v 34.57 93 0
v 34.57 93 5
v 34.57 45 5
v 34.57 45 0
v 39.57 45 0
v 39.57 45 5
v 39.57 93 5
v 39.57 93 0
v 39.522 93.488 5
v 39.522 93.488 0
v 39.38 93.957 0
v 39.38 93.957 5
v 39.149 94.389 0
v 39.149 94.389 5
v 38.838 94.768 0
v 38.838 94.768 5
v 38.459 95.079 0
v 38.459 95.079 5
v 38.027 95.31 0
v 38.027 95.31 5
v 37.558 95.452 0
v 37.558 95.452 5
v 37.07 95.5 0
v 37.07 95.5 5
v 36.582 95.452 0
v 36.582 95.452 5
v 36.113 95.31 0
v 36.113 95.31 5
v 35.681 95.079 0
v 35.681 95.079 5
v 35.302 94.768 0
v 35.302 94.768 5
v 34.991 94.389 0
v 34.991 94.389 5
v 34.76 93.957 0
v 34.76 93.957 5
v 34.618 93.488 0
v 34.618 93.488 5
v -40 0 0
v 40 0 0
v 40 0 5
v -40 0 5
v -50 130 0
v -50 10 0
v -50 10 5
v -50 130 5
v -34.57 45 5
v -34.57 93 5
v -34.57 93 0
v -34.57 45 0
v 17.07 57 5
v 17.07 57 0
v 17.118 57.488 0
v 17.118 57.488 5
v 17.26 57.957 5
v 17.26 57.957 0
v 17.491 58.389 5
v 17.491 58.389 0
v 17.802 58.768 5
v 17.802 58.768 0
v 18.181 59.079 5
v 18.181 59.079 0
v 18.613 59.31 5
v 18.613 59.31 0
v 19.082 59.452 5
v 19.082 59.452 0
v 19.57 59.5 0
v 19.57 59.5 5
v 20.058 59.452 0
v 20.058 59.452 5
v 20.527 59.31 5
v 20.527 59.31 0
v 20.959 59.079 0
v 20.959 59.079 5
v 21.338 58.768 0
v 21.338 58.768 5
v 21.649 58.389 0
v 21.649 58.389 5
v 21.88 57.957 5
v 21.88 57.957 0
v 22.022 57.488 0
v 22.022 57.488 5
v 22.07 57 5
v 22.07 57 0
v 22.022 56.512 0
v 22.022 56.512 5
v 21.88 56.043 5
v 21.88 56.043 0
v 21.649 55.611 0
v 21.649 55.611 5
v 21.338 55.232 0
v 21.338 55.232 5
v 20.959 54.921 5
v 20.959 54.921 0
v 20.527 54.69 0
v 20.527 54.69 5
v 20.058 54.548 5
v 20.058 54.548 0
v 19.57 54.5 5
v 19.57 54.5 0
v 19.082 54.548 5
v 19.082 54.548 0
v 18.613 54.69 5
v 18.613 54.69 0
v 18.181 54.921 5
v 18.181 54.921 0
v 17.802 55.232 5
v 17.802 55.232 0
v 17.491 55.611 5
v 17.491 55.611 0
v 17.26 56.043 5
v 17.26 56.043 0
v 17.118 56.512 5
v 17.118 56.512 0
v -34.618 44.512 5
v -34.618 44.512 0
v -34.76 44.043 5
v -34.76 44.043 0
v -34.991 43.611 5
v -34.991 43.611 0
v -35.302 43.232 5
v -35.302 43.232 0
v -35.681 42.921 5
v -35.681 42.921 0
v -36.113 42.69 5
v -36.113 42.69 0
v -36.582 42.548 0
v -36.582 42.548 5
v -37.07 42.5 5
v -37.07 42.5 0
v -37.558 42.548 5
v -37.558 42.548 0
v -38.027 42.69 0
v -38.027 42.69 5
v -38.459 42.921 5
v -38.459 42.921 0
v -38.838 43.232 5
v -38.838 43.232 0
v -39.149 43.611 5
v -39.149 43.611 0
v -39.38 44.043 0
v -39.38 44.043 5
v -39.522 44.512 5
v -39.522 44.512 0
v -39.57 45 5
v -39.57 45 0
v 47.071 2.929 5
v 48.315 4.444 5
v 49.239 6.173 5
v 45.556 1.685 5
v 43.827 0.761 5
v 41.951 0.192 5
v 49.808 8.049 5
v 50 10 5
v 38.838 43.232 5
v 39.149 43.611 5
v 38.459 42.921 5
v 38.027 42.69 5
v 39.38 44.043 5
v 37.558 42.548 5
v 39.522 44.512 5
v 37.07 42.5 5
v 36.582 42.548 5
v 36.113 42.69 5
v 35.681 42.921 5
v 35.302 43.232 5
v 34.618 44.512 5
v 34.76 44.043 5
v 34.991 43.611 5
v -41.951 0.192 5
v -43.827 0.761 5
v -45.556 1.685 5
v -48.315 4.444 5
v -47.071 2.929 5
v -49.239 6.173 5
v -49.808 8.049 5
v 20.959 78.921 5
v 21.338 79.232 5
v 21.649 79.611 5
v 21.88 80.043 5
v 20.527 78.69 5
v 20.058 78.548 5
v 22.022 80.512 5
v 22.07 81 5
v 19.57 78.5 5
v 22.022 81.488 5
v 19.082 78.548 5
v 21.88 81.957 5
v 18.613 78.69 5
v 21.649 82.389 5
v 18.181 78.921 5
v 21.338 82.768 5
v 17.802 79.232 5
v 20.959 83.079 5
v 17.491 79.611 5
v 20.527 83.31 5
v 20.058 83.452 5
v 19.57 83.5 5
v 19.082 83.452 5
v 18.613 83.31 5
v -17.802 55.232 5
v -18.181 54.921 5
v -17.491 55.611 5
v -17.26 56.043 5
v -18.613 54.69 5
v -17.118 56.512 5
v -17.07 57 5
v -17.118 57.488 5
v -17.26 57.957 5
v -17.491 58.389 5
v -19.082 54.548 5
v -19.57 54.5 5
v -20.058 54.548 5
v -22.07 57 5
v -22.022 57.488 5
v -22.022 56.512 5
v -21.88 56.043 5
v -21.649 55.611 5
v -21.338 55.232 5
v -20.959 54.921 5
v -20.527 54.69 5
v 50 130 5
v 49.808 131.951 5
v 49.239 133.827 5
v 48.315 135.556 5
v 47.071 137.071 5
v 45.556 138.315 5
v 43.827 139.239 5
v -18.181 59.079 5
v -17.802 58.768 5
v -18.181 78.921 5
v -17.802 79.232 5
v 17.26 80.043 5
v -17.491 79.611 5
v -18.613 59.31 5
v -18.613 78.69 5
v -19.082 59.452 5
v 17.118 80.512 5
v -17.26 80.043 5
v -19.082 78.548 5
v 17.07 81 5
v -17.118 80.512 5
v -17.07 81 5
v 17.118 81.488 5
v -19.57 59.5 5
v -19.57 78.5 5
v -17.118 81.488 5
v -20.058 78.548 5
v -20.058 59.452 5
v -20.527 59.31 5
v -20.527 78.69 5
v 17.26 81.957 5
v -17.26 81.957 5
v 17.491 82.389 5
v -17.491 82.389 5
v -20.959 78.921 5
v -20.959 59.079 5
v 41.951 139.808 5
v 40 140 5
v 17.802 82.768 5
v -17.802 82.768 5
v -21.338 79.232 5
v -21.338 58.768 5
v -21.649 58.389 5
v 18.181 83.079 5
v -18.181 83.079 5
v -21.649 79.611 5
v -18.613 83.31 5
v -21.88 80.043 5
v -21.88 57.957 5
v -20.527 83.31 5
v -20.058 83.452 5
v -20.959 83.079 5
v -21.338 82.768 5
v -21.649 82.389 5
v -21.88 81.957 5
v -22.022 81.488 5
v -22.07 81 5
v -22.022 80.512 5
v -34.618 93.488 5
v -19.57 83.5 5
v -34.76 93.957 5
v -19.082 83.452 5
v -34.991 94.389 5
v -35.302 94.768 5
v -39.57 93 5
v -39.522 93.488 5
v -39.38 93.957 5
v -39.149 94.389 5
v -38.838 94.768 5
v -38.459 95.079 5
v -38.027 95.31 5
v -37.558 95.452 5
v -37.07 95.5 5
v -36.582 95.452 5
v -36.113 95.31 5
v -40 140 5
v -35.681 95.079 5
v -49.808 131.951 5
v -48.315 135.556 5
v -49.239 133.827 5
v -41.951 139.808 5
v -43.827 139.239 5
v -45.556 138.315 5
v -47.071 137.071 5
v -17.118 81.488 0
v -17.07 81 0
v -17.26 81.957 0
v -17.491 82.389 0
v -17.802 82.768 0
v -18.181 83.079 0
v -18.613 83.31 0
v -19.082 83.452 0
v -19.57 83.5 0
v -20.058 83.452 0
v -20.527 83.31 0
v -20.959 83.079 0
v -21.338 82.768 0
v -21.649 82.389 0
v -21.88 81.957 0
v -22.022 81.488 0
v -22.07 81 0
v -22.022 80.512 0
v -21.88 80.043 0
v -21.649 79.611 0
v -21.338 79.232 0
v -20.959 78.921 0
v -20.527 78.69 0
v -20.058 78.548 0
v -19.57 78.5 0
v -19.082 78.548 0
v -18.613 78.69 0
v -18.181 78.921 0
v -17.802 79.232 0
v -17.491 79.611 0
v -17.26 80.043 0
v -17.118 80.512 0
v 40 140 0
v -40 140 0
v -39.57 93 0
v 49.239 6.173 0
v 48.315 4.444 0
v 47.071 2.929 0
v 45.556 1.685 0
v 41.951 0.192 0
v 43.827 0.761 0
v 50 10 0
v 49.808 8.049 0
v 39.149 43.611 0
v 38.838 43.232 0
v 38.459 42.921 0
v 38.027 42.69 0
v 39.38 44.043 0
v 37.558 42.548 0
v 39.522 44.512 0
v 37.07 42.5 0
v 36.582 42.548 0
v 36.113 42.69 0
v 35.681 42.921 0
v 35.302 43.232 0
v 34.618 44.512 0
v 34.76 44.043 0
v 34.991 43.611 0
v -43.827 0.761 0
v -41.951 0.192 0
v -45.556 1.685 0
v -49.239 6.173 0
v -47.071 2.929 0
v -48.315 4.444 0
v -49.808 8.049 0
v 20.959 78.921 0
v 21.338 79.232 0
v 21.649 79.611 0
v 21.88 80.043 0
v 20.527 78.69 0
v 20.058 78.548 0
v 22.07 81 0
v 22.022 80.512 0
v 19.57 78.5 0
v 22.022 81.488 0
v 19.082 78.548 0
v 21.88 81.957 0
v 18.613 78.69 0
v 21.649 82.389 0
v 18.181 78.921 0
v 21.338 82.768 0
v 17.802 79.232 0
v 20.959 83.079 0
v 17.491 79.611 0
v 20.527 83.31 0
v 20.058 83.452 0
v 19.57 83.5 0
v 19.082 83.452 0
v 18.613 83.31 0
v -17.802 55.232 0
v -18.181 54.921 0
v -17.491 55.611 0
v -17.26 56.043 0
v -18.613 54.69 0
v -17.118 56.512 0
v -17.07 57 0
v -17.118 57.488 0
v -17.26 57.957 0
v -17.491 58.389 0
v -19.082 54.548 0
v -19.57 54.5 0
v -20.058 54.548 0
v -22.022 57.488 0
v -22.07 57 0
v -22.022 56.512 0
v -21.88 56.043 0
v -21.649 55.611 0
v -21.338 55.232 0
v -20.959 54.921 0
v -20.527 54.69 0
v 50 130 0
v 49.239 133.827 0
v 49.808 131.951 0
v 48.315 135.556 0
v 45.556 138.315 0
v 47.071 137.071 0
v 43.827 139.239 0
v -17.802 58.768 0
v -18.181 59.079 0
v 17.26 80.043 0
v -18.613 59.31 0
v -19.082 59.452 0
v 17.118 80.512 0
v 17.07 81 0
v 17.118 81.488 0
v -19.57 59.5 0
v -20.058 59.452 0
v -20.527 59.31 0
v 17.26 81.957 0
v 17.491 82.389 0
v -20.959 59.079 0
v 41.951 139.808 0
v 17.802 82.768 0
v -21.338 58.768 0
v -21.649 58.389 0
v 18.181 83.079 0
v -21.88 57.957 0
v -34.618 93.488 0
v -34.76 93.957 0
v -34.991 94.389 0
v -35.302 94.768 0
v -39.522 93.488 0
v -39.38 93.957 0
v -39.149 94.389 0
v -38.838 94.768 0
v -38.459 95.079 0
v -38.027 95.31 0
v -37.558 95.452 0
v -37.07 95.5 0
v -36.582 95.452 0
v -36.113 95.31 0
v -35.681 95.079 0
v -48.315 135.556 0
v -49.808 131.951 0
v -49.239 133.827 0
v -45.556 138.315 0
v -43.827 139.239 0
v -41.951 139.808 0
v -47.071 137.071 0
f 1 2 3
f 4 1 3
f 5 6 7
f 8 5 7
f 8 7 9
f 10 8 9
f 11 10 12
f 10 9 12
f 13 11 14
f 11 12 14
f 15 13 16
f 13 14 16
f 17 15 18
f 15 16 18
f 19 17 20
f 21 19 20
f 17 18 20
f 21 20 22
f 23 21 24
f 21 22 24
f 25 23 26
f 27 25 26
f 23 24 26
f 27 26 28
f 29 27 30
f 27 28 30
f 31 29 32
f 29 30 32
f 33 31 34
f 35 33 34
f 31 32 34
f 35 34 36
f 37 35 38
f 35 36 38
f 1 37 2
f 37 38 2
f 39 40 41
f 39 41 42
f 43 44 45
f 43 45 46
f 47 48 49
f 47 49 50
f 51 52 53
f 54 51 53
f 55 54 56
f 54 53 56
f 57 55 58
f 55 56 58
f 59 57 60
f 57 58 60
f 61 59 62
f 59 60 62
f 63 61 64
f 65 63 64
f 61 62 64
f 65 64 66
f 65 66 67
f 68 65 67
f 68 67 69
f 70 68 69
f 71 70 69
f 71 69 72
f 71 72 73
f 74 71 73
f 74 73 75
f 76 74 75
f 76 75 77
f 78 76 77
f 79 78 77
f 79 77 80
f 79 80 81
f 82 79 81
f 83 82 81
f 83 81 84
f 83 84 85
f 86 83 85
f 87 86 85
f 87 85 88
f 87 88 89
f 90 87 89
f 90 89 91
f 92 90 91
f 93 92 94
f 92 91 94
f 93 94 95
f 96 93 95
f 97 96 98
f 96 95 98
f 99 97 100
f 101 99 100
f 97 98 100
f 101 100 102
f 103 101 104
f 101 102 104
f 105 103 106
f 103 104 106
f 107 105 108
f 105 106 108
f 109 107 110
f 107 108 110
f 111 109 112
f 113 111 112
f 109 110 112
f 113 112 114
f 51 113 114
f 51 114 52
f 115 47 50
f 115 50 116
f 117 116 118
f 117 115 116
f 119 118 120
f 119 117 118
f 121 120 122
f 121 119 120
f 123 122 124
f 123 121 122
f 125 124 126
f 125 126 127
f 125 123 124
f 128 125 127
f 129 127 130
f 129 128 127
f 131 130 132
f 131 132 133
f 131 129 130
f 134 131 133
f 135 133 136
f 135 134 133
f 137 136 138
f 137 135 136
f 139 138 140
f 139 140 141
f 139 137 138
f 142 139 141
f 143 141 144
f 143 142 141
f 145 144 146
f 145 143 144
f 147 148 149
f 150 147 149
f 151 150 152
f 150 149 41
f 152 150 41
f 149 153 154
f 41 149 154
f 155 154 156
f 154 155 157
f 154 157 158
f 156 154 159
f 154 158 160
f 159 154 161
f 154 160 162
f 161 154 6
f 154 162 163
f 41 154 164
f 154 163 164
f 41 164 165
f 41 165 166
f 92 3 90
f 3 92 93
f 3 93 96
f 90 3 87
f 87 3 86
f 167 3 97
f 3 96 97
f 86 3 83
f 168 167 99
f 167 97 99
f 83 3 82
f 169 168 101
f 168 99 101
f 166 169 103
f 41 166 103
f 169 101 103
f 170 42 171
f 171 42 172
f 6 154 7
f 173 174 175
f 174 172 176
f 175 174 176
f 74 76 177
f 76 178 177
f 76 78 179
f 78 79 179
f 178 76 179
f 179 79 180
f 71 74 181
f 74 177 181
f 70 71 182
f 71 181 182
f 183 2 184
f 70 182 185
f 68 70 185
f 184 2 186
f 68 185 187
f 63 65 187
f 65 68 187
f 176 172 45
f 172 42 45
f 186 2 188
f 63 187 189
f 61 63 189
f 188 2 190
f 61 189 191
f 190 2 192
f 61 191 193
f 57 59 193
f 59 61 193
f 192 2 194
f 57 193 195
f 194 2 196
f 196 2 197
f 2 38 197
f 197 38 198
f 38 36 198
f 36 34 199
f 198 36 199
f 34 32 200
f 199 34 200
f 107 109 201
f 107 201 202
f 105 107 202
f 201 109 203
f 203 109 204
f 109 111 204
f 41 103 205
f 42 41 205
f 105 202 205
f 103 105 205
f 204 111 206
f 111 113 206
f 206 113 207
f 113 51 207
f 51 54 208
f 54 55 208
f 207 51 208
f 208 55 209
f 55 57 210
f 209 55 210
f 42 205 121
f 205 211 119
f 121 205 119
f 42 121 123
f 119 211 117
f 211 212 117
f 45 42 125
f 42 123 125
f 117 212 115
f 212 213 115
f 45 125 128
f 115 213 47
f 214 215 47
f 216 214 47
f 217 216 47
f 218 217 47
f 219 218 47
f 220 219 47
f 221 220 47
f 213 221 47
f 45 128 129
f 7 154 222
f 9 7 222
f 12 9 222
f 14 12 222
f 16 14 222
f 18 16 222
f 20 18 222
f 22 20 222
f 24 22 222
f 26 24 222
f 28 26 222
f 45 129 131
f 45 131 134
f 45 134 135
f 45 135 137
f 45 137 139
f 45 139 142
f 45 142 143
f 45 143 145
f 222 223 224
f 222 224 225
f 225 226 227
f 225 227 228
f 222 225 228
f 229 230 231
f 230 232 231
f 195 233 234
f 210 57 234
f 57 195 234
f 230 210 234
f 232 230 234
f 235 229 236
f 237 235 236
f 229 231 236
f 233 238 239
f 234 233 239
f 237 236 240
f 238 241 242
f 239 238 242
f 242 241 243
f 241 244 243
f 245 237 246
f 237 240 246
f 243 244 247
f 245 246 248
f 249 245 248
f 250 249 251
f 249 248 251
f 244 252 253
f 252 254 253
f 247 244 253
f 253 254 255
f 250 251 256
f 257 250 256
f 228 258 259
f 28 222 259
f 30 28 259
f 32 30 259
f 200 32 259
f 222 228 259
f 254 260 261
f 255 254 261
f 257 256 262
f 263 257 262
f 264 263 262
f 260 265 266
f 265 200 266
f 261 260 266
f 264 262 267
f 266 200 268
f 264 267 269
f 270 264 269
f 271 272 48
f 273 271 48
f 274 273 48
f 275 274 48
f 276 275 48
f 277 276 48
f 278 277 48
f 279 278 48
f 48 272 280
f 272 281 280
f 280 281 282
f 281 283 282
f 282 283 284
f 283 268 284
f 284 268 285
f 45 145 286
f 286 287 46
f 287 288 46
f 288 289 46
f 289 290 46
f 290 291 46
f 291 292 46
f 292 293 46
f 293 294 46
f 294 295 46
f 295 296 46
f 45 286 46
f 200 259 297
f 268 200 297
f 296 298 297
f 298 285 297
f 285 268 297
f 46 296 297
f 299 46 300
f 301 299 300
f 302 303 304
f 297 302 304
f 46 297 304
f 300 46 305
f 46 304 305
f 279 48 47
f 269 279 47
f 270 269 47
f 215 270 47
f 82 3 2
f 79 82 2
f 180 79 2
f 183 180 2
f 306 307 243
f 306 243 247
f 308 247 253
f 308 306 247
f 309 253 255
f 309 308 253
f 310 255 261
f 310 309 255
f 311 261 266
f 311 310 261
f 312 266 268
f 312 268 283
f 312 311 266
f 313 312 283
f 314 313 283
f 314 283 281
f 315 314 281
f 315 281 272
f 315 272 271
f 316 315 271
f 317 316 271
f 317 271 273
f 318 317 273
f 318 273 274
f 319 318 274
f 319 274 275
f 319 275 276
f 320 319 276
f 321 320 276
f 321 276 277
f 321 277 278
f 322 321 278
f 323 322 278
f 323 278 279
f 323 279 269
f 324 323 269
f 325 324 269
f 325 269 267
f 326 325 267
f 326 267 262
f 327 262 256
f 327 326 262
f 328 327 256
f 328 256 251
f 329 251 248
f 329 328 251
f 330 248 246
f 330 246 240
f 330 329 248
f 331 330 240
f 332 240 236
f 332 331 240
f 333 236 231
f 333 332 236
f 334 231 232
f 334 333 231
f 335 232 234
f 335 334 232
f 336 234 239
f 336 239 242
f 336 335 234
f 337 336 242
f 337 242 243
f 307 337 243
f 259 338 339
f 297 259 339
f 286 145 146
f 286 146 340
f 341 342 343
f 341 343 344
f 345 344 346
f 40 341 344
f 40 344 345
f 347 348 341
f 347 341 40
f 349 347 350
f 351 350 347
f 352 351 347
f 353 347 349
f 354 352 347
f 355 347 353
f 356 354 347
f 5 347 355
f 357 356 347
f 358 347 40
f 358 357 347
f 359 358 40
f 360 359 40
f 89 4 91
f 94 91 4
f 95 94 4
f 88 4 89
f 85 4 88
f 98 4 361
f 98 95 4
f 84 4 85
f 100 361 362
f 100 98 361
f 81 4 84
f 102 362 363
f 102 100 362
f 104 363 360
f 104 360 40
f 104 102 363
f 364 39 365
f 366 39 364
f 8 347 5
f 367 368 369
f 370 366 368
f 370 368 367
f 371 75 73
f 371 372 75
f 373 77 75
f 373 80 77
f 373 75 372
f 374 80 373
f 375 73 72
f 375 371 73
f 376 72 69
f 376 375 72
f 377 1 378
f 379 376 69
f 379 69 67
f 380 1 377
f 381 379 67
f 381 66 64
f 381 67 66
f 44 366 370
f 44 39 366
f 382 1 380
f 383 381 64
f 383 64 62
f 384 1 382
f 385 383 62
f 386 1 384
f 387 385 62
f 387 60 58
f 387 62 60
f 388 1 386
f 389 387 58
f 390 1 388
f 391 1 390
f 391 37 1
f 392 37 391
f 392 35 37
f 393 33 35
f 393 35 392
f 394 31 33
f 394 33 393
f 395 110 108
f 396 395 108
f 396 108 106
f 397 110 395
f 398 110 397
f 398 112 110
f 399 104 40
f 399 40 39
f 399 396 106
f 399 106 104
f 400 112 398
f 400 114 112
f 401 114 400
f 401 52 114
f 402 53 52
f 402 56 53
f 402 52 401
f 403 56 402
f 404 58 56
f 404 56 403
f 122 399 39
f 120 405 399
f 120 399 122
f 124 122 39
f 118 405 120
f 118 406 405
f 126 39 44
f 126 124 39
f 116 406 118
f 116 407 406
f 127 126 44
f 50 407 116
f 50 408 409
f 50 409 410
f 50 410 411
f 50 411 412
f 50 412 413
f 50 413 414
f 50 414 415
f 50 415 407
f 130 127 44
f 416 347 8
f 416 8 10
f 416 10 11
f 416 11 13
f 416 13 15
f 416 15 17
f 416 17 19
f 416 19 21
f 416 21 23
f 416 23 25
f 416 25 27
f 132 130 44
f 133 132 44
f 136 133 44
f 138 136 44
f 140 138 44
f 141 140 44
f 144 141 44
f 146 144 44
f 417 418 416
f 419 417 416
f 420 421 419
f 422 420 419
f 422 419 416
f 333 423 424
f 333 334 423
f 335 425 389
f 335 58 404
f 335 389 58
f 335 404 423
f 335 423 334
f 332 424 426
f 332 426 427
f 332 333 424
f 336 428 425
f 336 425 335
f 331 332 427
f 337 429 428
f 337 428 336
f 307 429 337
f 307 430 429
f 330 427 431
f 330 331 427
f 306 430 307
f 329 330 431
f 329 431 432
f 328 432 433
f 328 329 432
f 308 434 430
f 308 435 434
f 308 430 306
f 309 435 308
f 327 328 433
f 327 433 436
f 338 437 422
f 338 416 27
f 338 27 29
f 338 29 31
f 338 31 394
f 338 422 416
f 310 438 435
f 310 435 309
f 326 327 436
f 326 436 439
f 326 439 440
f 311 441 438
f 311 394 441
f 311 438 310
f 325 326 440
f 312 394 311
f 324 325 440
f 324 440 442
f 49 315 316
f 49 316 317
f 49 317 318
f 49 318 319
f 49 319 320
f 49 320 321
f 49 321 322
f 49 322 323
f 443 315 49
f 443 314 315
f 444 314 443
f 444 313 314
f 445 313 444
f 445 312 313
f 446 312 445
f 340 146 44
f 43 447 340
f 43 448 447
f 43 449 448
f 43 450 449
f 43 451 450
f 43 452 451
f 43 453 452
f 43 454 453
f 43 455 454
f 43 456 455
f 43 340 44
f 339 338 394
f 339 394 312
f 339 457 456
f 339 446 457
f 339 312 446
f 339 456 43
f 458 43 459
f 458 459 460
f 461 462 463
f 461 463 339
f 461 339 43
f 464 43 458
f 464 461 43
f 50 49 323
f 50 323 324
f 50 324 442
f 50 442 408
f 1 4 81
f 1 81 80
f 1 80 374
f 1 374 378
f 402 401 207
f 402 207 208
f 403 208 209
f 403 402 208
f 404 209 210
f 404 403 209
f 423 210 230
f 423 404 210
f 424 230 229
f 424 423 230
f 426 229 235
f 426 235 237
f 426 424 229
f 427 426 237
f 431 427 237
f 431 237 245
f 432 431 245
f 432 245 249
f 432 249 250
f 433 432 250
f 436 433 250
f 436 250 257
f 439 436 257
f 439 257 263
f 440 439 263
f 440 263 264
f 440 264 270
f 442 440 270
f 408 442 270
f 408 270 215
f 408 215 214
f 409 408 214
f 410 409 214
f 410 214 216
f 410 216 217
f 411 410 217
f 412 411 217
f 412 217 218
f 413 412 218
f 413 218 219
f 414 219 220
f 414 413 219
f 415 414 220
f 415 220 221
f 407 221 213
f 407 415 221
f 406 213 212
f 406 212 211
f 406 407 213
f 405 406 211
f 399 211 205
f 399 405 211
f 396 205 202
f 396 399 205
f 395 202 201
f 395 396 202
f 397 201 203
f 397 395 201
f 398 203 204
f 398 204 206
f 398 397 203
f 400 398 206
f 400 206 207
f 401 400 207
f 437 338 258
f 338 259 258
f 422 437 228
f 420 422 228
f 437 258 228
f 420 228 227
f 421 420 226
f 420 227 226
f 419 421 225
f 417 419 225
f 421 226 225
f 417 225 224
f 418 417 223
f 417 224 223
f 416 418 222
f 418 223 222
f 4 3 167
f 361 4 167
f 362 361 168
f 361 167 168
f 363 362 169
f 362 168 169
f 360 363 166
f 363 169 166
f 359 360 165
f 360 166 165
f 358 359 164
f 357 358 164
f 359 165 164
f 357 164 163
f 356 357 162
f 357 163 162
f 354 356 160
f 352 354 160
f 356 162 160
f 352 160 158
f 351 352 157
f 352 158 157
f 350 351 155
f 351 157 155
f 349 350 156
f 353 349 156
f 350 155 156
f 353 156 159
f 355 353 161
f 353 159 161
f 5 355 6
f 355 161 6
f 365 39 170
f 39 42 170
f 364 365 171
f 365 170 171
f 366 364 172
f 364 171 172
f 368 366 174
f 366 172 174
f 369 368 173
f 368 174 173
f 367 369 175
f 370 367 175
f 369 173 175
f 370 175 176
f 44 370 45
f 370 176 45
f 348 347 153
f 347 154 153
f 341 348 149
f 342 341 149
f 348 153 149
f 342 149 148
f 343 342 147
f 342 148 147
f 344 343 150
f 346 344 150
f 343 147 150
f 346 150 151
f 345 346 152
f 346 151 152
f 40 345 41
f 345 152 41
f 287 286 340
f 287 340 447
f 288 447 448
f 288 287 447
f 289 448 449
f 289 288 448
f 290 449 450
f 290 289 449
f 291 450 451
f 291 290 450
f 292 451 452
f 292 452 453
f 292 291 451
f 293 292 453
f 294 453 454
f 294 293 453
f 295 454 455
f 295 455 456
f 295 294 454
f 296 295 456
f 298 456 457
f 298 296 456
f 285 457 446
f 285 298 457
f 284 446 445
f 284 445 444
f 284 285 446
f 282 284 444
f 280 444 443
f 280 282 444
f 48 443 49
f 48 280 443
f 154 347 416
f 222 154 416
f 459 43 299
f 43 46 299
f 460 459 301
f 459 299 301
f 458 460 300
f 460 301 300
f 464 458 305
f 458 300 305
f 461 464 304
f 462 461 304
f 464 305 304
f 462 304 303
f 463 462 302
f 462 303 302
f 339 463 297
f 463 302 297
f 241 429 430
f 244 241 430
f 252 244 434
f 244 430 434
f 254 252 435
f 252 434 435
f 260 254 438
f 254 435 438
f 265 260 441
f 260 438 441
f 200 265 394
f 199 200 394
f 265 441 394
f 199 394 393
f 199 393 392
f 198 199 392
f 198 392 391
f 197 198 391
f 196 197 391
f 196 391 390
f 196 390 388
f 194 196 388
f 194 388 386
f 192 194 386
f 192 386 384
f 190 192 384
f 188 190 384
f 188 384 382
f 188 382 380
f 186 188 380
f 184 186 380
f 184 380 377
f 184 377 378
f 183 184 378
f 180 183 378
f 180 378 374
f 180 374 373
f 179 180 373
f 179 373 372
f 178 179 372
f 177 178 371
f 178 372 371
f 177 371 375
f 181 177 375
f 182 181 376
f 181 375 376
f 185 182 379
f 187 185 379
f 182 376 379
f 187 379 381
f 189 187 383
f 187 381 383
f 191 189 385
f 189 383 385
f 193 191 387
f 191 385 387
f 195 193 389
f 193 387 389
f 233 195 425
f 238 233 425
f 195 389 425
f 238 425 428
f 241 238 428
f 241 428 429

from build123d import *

# Parameters (mm, degrees)
F0_W     = 50
F0_H     = 140
F1_DEPTH = 5
F4_DEPTH = 62.609963119
F6_D     = 5
F8_R     = 10
F9_R     = 10
F10_R    = 10
F11_R    = 10


with BuildPart() as f1:
    # F0 (on Top) → F1 (new body)
    with BuildSketch(Plane.XY):
        with Locations((25, 70)):
            Rectangle(F0_W, F0_H)
    extrude(amount=F1_DEPTH)

    # F3 (on face) → F4 (cut)
    with BuildSketch(Plane.XY.offset(5)):
        with BuildLine():
            ThreePointArc((34.5700508356, 45), (37.0700508356, 42.5), (39.5700508356, 45))
            Line((39.5700508356, 45), (39.5700508356, 93))
            ThreePointArc((39.5700508356, 93), (37.0700508356, 95.5), (34.5700508356, 93))
            Line((34.5700508356, 93), (34.5700508356, 45))
        make_face()
    extrude(amount=-F4_DEPTH, mode=Mode.SUBTRACT)

    # F6 (through all)
    with Locations(Plane.XY.offset(5)):
        with Locations((19.5700508356, 57), (19.5700508356, 81)):
            Hole(F6_D / 2)

    # F7: F1 across plane


with BuildPart() as f1_1:
    add(f1.part)
    add(f1.part.mirror(Plane.YZ))

    # F8
    f8_edges = [f1_1.edges().sort_by_distance(p)[0] for p in [
        (50, 140, 2.5),
    ]]
    fillet(f8_edges, radius=F8_R)

    # F9
    f9_edges = [f1_1.edges().sort_by_distance(p)[0] for p in [
        (50, 0, 2.5),
    ]]
    fillet(f9_edges, radius=F9_R)

    # F10
    f10_edges = [f1_1.edges().sort_by_distance(p)[0] for p in [
        (-50, 0, 2.5),
    ]]
    fillet(f10_edges, radius=F10_R)

    # F11
    f11_edges = [f1_1.edges().sort_by_distance(p)[0] for p in [
        (-50, 140, 2.5),
    ]]
    fillet(f11_edges, radius=F11_R)


solid = f1_1.part
